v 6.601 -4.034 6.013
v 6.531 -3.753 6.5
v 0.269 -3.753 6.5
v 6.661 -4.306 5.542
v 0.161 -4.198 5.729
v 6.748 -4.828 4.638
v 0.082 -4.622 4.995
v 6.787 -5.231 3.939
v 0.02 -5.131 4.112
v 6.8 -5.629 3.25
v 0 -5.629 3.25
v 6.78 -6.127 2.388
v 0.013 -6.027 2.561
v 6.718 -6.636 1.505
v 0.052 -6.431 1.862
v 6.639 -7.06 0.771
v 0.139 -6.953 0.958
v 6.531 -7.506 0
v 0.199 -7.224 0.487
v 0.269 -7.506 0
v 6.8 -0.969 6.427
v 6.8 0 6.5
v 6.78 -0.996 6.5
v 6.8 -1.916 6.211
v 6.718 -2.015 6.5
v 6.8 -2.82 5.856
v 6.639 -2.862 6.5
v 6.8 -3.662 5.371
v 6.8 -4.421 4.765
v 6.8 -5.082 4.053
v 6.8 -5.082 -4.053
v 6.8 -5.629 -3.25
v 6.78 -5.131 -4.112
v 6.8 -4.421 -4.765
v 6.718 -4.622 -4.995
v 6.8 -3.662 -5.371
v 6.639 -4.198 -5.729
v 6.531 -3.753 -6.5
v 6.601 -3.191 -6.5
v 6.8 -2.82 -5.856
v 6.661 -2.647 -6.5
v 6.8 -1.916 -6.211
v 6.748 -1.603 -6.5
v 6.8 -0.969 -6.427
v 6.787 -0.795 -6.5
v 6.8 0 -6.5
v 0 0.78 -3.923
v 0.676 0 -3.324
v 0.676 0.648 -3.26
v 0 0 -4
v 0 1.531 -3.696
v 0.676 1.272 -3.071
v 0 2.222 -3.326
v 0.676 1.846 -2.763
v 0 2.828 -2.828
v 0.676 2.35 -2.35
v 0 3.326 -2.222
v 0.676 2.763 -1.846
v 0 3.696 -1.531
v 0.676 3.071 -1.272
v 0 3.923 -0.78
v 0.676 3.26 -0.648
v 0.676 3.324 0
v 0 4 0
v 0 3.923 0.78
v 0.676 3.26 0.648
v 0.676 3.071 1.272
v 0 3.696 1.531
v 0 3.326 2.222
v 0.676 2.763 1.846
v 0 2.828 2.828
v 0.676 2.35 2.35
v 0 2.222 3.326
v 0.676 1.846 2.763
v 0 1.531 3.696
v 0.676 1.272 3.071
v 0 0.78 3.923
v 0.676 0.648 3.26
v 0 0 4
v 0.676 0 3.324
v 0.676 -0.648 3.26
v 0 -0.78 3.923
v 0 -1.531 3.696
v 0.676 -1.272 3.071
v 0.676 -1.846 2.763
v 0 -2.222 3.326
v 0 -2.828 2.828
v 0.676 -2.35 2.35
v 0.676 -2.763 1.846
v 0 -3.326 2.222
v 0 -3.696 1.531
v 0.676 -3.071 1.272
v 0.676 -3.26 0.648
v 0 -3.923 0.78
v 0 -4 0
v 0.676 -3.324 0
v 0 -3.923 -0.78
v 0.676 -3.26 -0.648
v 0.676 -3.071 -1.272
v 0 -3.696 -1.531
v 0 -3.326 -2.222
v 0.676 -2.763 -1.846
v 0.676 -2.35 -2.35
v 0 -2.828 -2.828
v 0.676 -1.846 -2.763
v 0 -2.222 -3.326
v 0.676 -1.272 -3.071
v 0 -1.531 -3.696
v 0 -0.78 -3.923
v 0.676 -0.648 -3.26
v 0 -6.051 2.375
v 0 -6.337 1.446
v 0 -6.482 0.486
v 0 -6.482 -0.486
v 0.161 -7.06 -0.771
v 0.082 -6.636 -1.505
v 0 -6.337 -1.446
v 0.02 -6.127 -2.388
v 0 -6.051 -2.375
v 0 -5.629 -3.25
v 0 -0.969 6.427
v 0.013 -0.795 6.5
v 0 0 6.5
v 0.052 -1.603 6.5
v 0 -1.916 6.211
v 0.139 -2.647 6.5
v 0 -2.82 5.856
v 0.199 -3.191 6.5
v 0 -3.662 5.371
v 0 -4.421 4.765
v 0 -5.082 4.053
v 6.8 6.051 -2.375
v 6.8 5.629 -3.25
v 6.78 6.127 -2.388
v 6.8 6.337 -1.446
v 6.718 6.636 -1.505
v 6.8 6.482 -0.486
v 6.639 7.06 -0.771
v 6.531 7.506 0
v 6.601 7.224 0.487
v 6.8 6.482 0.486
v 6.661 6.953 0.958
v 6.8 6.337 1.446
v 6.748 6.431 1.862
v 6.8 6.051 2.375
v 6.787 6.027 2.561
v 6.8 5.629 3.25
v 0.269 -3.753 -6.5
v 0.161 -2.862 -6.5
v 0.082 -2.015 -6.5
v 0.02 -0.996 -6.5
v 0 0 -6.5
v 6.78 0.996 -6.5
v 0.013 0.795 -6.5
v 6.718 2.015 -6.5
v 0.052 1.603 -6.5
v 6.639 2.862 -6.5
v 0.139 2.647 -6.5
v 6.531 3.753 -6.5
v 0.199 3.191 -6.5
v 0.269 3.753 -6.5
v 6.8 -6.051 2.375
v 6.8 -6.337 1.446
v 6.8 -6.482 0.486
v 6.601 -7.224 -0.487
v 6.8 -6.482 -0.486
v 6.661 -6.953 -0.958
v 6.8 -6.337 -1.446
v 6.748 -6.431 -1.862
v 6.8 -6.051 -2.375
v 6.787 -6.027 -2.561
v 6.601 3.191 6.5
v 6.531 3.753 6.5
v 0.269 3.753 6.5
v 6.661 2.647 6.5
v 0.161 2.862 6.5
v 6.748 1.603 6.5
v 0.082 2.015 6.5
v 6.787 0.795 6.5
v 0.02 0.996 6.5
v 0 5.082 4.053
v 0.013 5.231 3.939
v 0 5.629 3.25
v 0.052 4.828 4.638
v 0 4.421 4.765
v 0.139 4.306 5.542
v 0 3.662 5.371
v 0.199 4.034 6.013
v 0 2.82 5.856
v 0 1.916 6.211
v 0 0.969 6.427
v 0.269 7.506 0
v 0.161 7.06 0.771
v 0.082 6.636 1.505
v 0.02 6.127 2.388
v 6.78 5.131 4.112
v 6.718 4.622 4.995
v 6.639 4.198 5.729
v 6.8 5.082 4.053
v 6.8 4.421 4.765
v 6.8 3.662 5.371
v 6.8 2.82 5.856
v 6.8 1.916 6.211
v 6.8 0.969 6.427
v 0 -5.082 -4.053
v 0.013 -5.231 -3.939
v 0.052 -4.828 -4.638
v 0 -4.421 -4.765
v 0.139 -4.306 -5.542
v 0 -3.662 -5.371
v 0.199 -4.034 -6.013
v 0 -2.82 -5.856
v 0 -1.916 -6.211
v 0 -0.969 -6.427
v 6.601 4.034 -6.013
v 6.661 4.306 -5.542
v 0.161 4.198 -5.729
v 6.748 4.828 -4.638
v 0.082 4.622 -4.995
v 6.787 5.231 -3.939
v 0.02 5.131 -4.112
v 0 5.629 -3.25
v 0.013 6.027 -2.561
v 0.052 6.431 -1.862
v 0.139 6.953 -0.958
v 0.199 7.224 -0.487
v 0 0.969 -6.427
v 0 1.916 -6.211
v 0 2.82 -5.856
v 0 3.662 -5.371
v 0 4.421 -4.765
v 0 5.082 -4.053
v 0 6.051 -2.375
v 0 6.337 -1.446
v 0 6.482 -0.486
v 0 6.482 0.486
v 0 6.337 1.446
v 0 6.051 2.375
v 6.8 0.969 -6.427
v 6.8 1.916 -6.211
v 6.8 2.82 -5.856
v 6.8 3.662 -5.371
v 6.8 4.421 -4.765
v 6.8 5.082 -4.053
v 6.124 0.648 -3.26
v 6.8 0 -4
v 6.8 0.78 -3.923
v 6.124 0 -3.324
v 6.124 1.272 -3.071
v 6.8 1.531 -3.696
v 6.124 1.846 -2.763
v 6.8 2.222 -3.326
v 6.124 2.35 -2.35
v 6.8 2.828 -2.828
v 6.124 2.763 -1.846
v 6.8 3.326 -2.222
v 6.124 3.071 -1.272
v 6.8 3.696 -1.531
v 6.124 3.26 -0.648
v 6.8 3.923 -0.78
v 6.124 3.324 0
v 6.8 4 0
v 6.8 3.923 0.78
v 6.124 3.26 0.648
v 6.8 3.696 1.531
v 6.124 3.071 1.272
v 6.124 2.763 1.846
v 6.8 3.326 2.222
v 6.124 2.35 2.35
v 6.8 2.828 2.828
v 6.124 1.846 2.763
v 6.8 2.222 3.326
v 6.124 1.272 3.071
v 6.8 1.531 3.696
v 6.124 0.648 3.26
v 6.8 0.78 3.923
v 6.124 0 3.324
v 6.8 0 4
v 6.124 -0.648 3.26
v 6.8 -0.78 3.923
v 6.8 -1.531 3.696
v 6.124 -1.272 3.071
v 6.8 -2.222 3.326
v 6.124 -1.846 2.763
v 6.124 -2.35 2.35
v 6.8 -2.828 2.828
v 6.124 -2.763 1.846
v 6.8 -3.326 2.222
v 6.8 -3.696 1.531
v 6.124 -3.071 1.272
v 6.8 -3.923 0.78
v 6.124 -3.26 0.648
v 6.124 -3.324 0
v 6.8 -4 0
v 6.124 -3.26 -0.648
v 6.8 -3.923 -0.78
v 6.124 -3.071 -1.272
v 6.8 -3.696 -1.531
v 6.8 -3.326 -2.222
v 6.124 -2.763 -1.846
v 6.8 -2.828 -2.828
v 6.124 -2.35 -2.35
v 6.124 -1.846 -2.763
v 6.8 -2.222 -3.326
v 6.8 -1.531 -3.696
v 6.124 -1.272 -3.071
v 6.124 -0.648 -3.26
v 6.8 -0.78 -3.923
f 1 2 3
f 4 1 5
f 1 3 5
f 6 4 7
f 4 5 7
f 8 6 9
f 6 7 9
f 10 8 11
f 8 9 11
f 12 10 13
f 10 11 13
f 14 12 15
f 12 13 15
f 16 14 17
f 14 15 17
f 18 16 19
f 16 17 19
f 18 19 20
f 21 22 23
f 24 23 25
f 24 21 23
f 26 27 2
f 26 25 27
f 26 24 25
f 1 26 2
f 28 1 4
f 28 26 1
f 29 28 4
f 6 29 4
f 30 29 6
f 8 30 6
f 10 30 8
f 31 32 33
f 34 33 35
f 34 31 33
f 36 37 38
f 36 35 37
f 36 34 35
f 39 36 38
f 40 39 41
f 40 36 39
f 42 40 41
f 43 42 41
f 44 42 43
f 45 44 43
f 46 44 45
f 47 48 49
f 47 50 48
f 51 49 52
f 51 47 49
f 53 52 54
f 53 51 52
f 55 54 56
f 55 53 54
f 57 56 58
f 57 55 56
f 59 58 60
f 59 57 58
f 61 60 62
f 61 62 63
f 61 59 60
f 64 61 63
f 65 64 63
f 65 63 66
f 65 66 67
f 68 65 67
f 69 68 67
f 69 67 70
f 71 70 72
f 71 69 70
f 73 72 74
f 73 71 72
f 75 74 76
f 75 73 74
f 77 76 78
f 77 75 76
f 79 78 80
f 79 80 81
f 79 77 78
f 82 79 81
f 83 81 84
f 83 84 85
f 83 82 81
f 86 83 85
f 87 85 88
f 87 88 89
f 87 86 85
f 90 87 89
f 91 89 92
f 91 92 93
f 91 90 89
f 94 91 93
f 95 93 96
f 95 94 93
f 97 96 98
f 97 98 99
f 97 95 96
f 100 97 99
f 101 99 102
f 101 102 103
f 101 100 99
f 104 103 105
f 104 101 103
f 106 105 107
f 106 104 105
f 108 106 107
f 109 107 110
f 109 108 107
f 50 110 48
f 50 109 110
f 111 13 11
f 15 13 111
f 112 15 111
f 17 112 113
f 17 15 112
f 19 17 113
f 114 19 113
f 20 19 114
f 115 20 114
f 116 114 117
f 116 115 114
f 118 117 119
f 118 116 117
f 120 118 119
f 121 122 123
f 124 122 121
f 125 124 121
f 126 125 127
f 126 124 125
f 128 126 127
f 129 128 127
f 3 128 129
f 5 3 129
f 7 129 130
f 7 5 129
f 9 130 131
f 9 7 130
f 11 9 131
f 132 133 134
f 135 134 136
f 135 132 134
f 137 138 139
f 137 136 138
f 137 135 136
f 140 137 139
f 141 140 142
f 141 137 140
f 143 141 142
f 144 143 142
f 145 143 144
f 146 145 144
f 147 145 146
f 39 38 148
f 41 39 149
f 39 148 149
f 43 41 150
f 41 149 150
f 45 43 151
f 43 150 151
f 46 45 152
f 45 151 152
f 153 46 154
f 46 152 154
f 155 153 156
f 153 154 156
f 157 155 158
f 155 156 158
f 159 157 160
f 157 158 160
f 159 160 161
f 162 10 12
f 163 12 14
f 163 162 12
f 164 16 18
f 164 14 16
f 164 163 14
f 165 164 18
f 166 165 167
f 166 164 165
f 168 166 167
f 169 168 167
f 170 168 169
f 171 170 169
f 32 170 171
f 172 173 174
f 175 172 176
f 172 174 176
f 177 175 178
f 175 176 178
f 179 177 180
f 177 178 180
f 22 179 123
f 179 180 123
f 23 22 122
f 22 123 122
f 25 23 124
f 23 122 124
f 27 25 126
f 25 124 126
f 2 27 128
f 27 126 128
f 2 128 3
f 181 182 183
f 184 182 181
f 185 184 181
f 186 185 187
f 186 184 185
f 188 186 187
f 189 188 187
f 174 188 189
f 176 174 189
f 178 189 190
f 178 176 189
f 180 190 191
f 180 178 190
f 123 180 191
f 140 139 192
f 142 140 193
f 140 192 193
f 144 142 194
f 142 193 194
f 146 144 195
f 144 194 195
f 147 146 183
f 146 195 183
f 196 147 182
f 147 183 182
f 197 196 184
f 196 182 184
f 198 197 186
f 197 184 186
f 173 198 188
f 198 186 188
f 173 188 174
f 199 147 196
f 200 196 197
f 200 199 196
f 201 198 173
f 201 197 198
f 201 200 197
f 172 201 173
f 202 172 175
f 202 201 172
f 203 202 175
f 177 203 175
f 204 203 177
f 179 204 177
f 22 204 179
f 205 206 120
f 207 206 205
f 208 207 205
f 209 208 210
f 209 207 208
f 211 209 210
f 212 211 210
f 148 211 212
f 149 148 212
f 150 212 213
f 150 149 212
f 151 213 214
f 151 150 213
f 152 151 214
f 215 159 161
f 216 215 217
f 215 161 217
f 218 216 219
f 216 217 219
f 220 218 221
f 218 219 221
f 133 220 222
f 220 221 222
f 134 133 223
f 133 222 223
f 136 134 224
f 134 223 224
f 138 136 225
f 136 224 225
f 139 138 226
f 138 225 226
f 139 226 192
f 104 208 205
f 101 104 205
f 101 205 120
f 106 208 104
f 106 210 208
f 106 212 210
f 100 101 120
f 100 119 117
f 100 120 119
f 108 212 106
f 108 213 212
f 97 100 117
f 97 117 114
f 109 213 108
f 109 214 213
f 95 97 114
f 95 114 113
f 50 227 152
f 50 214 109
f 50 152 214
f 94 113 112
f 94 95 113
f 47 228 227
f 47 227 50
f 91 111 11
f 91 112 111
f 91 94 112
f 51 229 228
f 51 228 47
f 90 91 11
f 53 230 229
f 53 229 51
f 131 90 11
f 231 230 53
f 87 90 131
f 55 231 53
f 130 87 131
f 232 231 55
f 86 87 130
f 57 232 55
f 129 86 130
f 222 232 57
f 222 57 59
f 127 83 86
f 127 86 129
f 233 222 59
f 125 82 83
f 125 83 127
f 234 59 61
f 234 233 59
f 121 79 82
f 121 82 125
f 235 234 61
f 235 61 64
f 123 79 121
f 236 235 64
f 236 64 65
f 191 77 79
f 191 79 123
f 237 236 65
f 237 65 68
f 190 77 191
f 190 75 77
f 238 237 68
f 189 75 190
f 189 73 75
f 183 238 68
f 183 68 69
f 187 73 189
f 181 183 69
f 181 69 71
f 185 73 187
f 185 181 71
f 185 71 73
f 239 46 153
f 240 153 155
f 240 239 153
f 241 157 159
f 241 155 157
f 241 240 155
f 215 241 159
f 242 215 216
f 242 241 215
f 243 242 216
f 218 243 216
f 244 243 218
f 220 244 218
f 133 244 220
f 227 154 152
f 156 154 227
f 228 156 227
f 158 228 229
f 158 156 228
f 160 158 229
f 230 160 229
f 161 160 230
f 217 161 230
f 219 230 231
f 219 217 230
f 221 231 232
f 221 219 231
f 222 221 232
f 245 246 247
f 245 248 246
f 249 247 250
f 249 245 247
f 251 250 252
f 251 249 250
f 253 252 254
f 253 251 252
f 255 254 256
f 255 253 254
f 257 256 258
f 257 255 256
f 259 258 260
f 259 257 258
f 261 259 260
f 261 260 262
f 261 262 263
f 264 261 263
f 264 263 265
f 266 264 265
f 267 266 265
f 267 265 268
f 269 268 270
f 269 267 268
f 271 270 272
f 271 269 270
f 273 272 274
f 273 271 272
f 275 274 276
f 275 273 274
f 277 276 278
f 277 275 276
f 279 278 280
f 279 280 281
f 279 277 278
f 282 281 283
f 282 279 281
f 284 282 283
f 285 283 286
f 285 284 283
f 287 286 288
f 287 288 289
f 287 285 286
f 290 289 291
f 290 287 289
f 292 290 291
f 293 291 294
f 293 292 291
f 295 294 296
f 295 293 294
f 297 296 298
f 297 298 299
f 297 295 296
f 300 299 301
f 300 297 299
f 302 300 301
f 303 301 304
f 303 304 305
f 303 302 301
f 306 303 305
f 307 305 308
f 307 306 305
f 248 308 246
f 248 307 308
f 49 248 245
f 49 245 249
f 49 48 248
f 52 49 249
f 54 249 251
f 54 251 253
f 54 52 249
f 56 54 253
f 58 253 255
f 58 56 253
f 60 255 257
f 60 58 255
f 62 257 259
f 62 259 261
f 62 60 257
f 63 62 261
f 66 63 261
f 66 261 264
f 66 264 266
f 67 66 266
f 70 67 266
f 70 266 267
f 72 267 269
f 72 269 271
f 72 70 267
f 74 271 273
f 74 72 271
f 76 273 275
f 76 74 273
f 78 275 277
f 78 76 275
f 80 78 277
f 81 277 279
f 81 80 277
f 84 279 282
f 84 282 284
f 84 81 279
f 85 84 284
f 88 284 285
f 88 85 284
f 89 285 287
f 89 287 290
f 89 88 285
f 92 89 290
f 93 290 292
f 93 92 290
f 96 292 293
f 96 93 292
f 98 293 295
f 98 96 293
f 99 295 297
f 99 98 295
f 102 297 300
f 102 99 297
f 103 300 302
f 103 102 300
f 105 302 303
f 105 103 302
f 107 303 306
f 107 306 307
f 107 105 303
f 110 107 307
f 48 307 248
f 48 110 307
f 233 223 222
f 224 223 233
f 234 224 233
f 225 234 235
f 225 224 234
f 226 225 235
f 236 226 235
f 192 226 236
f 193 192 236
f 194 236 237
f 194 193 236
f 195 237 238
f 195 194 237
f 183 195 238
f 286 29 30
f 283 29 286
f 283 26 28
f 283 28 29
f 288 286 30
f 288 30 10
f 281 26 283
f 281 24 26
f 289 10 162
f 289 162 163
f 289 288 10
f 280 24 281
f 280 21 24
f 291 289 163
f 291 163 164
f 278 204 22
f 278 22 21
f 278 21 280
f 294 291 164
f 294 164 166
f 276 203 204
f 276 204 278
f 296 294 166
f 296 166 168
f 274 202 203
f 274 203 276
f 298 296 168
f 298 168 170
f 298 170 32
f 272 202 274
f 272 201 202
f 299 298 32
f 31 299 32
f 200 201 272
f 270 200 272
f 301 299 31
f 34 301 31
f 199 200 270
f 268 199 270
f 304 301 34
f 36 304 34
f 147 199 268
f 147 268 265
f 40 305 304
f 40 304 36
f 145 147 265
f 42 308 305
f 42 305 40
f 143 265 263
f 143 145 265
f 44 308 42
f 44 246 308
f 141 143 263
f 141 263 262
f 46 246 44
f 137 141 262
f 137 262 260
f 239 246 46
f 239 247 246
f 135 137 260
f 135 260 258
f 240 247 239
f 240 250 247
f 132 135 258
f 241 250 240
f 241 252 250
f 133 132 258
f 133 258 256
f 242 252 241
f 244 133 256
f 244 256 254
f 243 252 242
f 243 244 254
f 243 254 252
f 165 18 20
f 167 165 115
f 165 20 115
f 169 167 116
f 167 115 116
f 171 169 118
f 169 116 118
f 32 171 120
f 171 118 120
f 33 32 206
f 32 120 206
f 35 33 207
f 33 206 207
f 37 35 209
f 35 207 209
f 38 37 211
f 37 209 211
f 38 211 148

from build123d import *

# Parameters (mm, degrees)
ENL_V_MAT_EXTRU_1_DEPTH      = 7.8
ENL_V_MAT_EXTRU_1_DEPTH_BACK = 7.8
ESQUISSE2_W                  = 52
ESQUISSE2_H                  = 52
ESQUISSE3_R                  = 4.875
BOSS_EXTRU_1_DEPTH           = 3.4


with BuildPart() as part:
    # Esquisse1 → Révolution1 (revolve)
    with BuildSketch(Plane(origin=(0, 0, 0), x_dir=(1, 0, 0), z_dir=(0, 1, 0)), mode=Mode.PRIVATE) as r_volution1_sk:
        Polygon((0, -6.5), (3.4, -19.188972746), (6.8, -6.5), (6.8, -4), (6.1235, -3.3235), (0.6765, -3.3235), (0, -4), align=None)
    revolve(r_volution1_sk.sketch.rotate(Axis((0, 0, 0), (1, 0, 0)), 180), axis=Axis((0, 0, 0), (1, 0, 0)))

    # Esquisse2 → Enlèv. mat.-Extru.1 (cut, two sides: drawn at the far end of the back side and taken through both)
    with BuildSketch(Plane(origin=(0, 0, 0), x_dir=(0, 0, -1), z_dir=(1, 0, 0)).offset(-ENL_V_MAT_EXTRU_1_DEPTH_BACK)):
        Rectangle(ESQUISSE2_W, ESQUISSE2_H)
        Polygon((-6.5, -3.75277675), (0, -7.505553499), (6.5, -3.75277675), (6.5, 3.75277675), (0, 7.505553499), (-6.5, 3.75277675), align=None, mode=Mode.SUBTRACT)
    extrude(amount=ENL_V_MAT_EXTRU_1_DEPTH + ENL_V_MAT_EXTRU_1_DEPTH_BACK, mode=Mode.SUBTRACT)


with BuildPart() as body_2:
    # Esquisse3 → Boss.-Extru.1 (new body)
    with BuildSketch(Plane(origin=(0, 0, 0), x_dir=(0, 0, -1), z_dir=(1, 0, 0))):
        with Locations(Location((0, 0, 0), (0, 0, 180))):
            Circle(ESQUISSE3_R)
    extrude(amount=BOSS_EXTRU_1_DEPTH)

    # SupprimerFace1: 1 face struck out; the rest of the skin is kept as a surface, the solid goes
    supprimerface1_1_drop = [body_2.part.faces().sort_by_distance(Vector(p))[0] for p in ((3.4, 0, 0),)]
    supprimerface1_1 = Shell(body_2.part.faces() - supprimerface1_1_drop)


solid = part.part
